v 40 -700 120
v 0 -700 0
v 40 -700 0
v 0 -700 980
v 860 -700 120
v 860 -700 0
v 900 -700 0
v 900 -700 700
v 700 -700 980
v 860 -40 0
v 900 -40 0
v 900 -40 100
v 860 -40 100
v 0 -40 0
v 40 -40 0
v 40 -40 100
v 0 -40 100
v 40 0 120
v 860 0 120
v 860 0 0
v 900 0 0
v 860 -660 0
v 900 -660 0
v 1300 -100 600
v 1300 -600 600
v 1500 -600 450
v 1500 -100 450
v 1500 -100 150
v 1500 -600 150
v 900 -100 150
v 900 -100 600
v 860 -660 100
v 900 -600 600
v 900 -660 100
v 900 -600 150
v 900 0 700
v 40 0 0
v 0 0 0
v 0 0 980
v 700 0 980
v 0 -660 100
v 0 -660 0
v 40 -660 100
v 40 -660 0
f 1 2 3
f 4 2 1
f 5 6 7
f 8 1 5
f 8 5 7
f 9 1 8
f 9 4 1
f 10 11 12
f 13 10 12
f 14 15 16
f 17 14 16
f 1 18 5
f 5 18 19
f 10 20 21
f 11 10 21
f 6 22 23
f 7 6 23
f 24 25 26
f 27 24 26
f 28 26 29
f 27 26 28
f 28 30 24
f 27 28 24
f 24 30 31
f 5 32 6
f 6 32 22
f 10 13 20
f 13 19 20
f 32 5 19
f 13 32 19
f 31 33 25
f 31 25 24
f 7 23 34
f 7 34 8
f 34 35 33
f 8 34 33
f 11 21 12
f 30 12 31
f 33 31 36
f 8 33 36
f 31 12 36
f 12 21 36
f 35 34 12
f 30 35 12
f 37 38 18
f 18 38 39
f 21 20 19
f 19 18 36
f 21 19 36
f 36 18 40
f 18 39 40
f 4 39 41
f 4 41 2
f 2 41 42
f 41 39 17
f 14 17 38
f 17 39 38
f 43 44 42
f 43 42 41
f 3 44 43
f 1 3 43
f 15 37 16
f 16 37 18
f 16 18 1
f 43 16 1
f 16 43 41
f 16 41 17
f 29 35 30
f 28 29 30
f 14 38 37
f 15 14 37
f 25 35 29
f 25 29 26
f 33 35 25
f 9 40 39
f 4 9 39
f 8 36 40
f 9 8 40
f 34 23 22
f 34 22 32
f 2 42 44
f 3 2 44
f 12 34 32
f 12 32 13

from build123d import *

# Parameters (mm, degrees)
F1_DEPTH = 700
F2_W     = 500
F2_H     = 450
F3_DEPTH = 600
F5_DEPTH = 600.001
F6_W     = 620
F6_H     = 100
F7_DEPTH = 900.001


with BuildPart() as f1:
    # F0 (on Front) → F1 (new body)
    with BuildSketch(Plane.XZ):
        Polygon((0, 980), (0, 0), (40, 0), (40, 120), (860, 120), (860, 0), (900, 0), (900, 700), (700, 980), align=None)
    extrude(amount=F1_DEPTH)

    # F2 (on face) → F3 (join)
    with BuildSketch(Plane.YZ.offset(900)):
        with Locations((-350, 375)):
            Rectangle(F2_W, F2_H)
    extrude(amount=F3_DEPTH)

    # F4 (on face) → F5 (cut, through all)
    with BuildSketch(Plane.XZ.offset(600)):
        Polygon((1500, 450), (1500, 600), (1300, 600), align=None)
    extrude(amount=-F5_DEPTH, mode=Mode.SUBTRACT)

    # F6 (on face) → F7 (cut, through all)
    with BuildSketch(Plane.YZ.offset(900)):
        with Locations((-350, 50)):
            Rectangle(F6_W, F6_H)
    extrude(amount=-F7_DEPTH, mode=Mode.SUBTRACT)


solid = f1.part
